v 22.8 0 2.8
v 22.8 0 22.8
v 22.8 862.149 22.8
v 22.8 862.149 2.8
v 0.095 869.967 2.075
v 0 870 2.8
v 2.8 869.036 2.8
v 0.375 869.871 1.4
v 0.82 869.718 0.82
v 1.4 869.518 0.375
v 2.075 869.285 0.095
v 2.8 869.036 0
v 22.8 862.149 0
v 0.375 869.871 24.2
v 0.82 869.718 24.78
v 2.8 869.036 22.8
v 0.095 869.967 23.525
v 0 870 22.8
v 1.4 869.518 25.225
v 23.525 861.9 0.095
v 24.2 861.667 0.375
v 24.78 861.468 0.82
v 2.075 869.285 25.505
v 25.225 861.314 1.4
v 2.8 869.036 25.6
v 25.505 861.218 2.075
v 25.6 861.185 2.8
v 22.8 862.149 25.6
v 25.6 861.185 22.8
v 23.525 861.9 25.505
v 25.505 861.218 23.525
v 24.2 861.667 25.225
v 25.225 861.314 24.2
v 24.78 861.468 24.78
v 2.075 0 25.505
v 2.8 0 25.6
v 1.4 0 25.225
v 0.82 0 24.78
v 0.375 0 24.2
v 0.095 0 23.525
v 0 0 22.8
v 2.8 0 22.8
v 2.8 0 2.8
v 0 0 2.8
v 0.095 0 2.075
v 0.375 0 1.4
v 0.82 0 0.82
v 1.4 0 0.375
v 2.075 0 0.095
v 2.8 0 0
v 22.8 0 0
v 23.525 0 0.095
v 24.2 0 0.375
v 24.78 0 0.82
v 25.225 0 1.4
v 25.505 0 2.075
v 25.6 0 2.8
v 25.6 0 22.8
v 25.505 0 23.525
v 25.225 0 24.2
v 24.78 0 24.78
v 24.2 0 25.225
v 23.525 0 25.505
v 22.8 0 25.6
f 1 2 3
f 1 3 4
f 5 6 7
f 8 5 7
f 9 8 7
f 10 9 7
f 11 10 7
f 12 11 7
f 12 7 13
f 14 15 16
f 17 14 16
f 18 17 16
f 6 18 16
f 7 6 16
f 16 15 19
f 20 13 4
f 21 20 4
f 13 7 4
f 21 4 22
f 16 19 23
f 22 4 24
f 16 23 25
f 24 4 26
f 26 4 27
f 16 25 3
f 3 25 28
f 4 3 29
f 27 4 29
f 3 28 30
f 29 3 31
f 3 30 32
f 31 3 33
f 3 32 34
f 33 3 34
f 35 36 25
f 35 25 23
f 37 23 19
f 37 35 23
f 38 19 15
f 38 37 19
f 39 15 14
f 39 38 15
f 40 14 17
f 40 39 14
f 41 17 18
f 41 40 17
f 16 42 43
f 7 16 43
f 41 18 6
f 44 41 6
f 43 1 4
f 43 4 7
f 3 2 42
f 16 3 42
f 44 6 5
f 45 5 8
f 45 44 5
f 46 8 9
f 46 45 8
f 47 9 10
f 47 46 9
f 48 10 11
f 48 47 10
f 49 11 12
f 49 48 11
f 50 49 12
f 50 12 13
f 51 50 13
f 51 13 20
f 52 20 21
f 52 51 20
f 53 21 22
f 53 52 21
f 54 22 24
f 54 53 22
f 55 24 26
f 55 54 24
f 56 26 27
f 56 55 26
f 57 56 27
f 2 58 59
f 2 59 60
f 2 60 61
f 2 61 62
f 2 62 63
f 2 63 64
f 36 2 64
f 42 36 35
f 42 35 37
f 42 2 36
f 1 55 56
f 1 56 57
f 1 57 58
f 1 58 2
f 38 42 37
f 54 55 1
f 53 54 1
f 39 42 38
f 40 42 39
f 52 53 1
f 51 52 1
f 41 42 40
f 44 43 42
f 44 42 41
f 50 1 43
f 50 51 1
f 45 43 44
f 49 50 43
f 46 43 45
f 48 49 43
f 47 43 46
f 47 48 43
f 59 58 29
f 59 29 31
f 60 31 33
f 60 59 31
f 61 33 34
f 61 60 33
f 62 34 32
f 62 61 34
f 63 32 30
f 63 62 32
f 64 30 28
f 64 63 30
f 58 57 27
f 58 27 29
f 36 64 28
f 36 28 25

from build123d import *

# Parameters (mm, degrees)
BOSS_EXTRUDE1_DEPTH     = 870
SKETCH3_W               = 20
SKETCH3_H               = 20
CUT_EXTRUDE1_DEPTH      = 1040.5
CUT_EXTRUDE6_DEPTH      = 871.675140337
CUT_EXTRUDE6_DEPTH_BACK = 871.675140337


with BuildPart() as part:
    # Sketch1 → Boss-Extrude1 (new body)
    with BuildSketch(Plane(origin=(0, 0, 0), x_dir=(1, 0, 0), z_dir=(0, 1, 0))):
        with BuildLine():
            Line((2.8, 0), (22.8, 0))
            ThreePointArc((22.8, 0), (24.779898987, -0.820101013), (25.6, -2.8))
            Line((25.6, -2.8), (25.6, -22.8))
            ThreePointArc((25.6, -22.8), (24.779898987, -24.779898987), (22.8, -25.6))
            Line((22.8, -25.6), (2.8, -25.6))
            ThreePointArc((2.8, -25.6), (0.820101013, -24.779898987), (0, -22.8))
            Line((0, -22.8), (0, -2.8))
            ThreePointArc((0, -2.8), (0.820101013, -0.820101013), (2.8, 0))
        make_face()
    extrude(amount=BOSS_EXTRUDE1_DEPTH)

    # Sketch3 → Cut-Extrude1 (cut)
    with BuildSketch(Plane(origin=(0, 0, 0), x_dir=(-1, 0, 0), z_dir=(0, -1, 0))):
        with Locations((-12.8, -12.8)):
            Rectangle(SKETCH3_W, SKETCH3_H)
    extrude(amount=-CUT_EXTRUDE1_DEPTH, mode=Mode.SUBTRACT)

    # Sketch4 → Cut-Extrude6 (cut, two sides: drawn at the far end of the back side and taken through both)
    with BuildSketch(Plane(origin=(0, 0, 22.8), x_dir=(-1, 0, 0), z_dir=(0, 0, -1)).offset(-CUT_EXTRUDE6_DEPTH_BACK)):
        Polygon((1655.369600379, 1439.989463611), (0, 870), (-25.6, 861.1852131), (-1680.969600379, 291.195749489), (-2820.948527601, 3601.934950248), (515.390673158, 4750.728664369), align=None)
    extrude(amount=CUT_EXTRUDE6_DEPTH + CUT_EXTRUDE6_DEPTH_BACK, mode=Mode.SUBTRACT)


solid = part.part
